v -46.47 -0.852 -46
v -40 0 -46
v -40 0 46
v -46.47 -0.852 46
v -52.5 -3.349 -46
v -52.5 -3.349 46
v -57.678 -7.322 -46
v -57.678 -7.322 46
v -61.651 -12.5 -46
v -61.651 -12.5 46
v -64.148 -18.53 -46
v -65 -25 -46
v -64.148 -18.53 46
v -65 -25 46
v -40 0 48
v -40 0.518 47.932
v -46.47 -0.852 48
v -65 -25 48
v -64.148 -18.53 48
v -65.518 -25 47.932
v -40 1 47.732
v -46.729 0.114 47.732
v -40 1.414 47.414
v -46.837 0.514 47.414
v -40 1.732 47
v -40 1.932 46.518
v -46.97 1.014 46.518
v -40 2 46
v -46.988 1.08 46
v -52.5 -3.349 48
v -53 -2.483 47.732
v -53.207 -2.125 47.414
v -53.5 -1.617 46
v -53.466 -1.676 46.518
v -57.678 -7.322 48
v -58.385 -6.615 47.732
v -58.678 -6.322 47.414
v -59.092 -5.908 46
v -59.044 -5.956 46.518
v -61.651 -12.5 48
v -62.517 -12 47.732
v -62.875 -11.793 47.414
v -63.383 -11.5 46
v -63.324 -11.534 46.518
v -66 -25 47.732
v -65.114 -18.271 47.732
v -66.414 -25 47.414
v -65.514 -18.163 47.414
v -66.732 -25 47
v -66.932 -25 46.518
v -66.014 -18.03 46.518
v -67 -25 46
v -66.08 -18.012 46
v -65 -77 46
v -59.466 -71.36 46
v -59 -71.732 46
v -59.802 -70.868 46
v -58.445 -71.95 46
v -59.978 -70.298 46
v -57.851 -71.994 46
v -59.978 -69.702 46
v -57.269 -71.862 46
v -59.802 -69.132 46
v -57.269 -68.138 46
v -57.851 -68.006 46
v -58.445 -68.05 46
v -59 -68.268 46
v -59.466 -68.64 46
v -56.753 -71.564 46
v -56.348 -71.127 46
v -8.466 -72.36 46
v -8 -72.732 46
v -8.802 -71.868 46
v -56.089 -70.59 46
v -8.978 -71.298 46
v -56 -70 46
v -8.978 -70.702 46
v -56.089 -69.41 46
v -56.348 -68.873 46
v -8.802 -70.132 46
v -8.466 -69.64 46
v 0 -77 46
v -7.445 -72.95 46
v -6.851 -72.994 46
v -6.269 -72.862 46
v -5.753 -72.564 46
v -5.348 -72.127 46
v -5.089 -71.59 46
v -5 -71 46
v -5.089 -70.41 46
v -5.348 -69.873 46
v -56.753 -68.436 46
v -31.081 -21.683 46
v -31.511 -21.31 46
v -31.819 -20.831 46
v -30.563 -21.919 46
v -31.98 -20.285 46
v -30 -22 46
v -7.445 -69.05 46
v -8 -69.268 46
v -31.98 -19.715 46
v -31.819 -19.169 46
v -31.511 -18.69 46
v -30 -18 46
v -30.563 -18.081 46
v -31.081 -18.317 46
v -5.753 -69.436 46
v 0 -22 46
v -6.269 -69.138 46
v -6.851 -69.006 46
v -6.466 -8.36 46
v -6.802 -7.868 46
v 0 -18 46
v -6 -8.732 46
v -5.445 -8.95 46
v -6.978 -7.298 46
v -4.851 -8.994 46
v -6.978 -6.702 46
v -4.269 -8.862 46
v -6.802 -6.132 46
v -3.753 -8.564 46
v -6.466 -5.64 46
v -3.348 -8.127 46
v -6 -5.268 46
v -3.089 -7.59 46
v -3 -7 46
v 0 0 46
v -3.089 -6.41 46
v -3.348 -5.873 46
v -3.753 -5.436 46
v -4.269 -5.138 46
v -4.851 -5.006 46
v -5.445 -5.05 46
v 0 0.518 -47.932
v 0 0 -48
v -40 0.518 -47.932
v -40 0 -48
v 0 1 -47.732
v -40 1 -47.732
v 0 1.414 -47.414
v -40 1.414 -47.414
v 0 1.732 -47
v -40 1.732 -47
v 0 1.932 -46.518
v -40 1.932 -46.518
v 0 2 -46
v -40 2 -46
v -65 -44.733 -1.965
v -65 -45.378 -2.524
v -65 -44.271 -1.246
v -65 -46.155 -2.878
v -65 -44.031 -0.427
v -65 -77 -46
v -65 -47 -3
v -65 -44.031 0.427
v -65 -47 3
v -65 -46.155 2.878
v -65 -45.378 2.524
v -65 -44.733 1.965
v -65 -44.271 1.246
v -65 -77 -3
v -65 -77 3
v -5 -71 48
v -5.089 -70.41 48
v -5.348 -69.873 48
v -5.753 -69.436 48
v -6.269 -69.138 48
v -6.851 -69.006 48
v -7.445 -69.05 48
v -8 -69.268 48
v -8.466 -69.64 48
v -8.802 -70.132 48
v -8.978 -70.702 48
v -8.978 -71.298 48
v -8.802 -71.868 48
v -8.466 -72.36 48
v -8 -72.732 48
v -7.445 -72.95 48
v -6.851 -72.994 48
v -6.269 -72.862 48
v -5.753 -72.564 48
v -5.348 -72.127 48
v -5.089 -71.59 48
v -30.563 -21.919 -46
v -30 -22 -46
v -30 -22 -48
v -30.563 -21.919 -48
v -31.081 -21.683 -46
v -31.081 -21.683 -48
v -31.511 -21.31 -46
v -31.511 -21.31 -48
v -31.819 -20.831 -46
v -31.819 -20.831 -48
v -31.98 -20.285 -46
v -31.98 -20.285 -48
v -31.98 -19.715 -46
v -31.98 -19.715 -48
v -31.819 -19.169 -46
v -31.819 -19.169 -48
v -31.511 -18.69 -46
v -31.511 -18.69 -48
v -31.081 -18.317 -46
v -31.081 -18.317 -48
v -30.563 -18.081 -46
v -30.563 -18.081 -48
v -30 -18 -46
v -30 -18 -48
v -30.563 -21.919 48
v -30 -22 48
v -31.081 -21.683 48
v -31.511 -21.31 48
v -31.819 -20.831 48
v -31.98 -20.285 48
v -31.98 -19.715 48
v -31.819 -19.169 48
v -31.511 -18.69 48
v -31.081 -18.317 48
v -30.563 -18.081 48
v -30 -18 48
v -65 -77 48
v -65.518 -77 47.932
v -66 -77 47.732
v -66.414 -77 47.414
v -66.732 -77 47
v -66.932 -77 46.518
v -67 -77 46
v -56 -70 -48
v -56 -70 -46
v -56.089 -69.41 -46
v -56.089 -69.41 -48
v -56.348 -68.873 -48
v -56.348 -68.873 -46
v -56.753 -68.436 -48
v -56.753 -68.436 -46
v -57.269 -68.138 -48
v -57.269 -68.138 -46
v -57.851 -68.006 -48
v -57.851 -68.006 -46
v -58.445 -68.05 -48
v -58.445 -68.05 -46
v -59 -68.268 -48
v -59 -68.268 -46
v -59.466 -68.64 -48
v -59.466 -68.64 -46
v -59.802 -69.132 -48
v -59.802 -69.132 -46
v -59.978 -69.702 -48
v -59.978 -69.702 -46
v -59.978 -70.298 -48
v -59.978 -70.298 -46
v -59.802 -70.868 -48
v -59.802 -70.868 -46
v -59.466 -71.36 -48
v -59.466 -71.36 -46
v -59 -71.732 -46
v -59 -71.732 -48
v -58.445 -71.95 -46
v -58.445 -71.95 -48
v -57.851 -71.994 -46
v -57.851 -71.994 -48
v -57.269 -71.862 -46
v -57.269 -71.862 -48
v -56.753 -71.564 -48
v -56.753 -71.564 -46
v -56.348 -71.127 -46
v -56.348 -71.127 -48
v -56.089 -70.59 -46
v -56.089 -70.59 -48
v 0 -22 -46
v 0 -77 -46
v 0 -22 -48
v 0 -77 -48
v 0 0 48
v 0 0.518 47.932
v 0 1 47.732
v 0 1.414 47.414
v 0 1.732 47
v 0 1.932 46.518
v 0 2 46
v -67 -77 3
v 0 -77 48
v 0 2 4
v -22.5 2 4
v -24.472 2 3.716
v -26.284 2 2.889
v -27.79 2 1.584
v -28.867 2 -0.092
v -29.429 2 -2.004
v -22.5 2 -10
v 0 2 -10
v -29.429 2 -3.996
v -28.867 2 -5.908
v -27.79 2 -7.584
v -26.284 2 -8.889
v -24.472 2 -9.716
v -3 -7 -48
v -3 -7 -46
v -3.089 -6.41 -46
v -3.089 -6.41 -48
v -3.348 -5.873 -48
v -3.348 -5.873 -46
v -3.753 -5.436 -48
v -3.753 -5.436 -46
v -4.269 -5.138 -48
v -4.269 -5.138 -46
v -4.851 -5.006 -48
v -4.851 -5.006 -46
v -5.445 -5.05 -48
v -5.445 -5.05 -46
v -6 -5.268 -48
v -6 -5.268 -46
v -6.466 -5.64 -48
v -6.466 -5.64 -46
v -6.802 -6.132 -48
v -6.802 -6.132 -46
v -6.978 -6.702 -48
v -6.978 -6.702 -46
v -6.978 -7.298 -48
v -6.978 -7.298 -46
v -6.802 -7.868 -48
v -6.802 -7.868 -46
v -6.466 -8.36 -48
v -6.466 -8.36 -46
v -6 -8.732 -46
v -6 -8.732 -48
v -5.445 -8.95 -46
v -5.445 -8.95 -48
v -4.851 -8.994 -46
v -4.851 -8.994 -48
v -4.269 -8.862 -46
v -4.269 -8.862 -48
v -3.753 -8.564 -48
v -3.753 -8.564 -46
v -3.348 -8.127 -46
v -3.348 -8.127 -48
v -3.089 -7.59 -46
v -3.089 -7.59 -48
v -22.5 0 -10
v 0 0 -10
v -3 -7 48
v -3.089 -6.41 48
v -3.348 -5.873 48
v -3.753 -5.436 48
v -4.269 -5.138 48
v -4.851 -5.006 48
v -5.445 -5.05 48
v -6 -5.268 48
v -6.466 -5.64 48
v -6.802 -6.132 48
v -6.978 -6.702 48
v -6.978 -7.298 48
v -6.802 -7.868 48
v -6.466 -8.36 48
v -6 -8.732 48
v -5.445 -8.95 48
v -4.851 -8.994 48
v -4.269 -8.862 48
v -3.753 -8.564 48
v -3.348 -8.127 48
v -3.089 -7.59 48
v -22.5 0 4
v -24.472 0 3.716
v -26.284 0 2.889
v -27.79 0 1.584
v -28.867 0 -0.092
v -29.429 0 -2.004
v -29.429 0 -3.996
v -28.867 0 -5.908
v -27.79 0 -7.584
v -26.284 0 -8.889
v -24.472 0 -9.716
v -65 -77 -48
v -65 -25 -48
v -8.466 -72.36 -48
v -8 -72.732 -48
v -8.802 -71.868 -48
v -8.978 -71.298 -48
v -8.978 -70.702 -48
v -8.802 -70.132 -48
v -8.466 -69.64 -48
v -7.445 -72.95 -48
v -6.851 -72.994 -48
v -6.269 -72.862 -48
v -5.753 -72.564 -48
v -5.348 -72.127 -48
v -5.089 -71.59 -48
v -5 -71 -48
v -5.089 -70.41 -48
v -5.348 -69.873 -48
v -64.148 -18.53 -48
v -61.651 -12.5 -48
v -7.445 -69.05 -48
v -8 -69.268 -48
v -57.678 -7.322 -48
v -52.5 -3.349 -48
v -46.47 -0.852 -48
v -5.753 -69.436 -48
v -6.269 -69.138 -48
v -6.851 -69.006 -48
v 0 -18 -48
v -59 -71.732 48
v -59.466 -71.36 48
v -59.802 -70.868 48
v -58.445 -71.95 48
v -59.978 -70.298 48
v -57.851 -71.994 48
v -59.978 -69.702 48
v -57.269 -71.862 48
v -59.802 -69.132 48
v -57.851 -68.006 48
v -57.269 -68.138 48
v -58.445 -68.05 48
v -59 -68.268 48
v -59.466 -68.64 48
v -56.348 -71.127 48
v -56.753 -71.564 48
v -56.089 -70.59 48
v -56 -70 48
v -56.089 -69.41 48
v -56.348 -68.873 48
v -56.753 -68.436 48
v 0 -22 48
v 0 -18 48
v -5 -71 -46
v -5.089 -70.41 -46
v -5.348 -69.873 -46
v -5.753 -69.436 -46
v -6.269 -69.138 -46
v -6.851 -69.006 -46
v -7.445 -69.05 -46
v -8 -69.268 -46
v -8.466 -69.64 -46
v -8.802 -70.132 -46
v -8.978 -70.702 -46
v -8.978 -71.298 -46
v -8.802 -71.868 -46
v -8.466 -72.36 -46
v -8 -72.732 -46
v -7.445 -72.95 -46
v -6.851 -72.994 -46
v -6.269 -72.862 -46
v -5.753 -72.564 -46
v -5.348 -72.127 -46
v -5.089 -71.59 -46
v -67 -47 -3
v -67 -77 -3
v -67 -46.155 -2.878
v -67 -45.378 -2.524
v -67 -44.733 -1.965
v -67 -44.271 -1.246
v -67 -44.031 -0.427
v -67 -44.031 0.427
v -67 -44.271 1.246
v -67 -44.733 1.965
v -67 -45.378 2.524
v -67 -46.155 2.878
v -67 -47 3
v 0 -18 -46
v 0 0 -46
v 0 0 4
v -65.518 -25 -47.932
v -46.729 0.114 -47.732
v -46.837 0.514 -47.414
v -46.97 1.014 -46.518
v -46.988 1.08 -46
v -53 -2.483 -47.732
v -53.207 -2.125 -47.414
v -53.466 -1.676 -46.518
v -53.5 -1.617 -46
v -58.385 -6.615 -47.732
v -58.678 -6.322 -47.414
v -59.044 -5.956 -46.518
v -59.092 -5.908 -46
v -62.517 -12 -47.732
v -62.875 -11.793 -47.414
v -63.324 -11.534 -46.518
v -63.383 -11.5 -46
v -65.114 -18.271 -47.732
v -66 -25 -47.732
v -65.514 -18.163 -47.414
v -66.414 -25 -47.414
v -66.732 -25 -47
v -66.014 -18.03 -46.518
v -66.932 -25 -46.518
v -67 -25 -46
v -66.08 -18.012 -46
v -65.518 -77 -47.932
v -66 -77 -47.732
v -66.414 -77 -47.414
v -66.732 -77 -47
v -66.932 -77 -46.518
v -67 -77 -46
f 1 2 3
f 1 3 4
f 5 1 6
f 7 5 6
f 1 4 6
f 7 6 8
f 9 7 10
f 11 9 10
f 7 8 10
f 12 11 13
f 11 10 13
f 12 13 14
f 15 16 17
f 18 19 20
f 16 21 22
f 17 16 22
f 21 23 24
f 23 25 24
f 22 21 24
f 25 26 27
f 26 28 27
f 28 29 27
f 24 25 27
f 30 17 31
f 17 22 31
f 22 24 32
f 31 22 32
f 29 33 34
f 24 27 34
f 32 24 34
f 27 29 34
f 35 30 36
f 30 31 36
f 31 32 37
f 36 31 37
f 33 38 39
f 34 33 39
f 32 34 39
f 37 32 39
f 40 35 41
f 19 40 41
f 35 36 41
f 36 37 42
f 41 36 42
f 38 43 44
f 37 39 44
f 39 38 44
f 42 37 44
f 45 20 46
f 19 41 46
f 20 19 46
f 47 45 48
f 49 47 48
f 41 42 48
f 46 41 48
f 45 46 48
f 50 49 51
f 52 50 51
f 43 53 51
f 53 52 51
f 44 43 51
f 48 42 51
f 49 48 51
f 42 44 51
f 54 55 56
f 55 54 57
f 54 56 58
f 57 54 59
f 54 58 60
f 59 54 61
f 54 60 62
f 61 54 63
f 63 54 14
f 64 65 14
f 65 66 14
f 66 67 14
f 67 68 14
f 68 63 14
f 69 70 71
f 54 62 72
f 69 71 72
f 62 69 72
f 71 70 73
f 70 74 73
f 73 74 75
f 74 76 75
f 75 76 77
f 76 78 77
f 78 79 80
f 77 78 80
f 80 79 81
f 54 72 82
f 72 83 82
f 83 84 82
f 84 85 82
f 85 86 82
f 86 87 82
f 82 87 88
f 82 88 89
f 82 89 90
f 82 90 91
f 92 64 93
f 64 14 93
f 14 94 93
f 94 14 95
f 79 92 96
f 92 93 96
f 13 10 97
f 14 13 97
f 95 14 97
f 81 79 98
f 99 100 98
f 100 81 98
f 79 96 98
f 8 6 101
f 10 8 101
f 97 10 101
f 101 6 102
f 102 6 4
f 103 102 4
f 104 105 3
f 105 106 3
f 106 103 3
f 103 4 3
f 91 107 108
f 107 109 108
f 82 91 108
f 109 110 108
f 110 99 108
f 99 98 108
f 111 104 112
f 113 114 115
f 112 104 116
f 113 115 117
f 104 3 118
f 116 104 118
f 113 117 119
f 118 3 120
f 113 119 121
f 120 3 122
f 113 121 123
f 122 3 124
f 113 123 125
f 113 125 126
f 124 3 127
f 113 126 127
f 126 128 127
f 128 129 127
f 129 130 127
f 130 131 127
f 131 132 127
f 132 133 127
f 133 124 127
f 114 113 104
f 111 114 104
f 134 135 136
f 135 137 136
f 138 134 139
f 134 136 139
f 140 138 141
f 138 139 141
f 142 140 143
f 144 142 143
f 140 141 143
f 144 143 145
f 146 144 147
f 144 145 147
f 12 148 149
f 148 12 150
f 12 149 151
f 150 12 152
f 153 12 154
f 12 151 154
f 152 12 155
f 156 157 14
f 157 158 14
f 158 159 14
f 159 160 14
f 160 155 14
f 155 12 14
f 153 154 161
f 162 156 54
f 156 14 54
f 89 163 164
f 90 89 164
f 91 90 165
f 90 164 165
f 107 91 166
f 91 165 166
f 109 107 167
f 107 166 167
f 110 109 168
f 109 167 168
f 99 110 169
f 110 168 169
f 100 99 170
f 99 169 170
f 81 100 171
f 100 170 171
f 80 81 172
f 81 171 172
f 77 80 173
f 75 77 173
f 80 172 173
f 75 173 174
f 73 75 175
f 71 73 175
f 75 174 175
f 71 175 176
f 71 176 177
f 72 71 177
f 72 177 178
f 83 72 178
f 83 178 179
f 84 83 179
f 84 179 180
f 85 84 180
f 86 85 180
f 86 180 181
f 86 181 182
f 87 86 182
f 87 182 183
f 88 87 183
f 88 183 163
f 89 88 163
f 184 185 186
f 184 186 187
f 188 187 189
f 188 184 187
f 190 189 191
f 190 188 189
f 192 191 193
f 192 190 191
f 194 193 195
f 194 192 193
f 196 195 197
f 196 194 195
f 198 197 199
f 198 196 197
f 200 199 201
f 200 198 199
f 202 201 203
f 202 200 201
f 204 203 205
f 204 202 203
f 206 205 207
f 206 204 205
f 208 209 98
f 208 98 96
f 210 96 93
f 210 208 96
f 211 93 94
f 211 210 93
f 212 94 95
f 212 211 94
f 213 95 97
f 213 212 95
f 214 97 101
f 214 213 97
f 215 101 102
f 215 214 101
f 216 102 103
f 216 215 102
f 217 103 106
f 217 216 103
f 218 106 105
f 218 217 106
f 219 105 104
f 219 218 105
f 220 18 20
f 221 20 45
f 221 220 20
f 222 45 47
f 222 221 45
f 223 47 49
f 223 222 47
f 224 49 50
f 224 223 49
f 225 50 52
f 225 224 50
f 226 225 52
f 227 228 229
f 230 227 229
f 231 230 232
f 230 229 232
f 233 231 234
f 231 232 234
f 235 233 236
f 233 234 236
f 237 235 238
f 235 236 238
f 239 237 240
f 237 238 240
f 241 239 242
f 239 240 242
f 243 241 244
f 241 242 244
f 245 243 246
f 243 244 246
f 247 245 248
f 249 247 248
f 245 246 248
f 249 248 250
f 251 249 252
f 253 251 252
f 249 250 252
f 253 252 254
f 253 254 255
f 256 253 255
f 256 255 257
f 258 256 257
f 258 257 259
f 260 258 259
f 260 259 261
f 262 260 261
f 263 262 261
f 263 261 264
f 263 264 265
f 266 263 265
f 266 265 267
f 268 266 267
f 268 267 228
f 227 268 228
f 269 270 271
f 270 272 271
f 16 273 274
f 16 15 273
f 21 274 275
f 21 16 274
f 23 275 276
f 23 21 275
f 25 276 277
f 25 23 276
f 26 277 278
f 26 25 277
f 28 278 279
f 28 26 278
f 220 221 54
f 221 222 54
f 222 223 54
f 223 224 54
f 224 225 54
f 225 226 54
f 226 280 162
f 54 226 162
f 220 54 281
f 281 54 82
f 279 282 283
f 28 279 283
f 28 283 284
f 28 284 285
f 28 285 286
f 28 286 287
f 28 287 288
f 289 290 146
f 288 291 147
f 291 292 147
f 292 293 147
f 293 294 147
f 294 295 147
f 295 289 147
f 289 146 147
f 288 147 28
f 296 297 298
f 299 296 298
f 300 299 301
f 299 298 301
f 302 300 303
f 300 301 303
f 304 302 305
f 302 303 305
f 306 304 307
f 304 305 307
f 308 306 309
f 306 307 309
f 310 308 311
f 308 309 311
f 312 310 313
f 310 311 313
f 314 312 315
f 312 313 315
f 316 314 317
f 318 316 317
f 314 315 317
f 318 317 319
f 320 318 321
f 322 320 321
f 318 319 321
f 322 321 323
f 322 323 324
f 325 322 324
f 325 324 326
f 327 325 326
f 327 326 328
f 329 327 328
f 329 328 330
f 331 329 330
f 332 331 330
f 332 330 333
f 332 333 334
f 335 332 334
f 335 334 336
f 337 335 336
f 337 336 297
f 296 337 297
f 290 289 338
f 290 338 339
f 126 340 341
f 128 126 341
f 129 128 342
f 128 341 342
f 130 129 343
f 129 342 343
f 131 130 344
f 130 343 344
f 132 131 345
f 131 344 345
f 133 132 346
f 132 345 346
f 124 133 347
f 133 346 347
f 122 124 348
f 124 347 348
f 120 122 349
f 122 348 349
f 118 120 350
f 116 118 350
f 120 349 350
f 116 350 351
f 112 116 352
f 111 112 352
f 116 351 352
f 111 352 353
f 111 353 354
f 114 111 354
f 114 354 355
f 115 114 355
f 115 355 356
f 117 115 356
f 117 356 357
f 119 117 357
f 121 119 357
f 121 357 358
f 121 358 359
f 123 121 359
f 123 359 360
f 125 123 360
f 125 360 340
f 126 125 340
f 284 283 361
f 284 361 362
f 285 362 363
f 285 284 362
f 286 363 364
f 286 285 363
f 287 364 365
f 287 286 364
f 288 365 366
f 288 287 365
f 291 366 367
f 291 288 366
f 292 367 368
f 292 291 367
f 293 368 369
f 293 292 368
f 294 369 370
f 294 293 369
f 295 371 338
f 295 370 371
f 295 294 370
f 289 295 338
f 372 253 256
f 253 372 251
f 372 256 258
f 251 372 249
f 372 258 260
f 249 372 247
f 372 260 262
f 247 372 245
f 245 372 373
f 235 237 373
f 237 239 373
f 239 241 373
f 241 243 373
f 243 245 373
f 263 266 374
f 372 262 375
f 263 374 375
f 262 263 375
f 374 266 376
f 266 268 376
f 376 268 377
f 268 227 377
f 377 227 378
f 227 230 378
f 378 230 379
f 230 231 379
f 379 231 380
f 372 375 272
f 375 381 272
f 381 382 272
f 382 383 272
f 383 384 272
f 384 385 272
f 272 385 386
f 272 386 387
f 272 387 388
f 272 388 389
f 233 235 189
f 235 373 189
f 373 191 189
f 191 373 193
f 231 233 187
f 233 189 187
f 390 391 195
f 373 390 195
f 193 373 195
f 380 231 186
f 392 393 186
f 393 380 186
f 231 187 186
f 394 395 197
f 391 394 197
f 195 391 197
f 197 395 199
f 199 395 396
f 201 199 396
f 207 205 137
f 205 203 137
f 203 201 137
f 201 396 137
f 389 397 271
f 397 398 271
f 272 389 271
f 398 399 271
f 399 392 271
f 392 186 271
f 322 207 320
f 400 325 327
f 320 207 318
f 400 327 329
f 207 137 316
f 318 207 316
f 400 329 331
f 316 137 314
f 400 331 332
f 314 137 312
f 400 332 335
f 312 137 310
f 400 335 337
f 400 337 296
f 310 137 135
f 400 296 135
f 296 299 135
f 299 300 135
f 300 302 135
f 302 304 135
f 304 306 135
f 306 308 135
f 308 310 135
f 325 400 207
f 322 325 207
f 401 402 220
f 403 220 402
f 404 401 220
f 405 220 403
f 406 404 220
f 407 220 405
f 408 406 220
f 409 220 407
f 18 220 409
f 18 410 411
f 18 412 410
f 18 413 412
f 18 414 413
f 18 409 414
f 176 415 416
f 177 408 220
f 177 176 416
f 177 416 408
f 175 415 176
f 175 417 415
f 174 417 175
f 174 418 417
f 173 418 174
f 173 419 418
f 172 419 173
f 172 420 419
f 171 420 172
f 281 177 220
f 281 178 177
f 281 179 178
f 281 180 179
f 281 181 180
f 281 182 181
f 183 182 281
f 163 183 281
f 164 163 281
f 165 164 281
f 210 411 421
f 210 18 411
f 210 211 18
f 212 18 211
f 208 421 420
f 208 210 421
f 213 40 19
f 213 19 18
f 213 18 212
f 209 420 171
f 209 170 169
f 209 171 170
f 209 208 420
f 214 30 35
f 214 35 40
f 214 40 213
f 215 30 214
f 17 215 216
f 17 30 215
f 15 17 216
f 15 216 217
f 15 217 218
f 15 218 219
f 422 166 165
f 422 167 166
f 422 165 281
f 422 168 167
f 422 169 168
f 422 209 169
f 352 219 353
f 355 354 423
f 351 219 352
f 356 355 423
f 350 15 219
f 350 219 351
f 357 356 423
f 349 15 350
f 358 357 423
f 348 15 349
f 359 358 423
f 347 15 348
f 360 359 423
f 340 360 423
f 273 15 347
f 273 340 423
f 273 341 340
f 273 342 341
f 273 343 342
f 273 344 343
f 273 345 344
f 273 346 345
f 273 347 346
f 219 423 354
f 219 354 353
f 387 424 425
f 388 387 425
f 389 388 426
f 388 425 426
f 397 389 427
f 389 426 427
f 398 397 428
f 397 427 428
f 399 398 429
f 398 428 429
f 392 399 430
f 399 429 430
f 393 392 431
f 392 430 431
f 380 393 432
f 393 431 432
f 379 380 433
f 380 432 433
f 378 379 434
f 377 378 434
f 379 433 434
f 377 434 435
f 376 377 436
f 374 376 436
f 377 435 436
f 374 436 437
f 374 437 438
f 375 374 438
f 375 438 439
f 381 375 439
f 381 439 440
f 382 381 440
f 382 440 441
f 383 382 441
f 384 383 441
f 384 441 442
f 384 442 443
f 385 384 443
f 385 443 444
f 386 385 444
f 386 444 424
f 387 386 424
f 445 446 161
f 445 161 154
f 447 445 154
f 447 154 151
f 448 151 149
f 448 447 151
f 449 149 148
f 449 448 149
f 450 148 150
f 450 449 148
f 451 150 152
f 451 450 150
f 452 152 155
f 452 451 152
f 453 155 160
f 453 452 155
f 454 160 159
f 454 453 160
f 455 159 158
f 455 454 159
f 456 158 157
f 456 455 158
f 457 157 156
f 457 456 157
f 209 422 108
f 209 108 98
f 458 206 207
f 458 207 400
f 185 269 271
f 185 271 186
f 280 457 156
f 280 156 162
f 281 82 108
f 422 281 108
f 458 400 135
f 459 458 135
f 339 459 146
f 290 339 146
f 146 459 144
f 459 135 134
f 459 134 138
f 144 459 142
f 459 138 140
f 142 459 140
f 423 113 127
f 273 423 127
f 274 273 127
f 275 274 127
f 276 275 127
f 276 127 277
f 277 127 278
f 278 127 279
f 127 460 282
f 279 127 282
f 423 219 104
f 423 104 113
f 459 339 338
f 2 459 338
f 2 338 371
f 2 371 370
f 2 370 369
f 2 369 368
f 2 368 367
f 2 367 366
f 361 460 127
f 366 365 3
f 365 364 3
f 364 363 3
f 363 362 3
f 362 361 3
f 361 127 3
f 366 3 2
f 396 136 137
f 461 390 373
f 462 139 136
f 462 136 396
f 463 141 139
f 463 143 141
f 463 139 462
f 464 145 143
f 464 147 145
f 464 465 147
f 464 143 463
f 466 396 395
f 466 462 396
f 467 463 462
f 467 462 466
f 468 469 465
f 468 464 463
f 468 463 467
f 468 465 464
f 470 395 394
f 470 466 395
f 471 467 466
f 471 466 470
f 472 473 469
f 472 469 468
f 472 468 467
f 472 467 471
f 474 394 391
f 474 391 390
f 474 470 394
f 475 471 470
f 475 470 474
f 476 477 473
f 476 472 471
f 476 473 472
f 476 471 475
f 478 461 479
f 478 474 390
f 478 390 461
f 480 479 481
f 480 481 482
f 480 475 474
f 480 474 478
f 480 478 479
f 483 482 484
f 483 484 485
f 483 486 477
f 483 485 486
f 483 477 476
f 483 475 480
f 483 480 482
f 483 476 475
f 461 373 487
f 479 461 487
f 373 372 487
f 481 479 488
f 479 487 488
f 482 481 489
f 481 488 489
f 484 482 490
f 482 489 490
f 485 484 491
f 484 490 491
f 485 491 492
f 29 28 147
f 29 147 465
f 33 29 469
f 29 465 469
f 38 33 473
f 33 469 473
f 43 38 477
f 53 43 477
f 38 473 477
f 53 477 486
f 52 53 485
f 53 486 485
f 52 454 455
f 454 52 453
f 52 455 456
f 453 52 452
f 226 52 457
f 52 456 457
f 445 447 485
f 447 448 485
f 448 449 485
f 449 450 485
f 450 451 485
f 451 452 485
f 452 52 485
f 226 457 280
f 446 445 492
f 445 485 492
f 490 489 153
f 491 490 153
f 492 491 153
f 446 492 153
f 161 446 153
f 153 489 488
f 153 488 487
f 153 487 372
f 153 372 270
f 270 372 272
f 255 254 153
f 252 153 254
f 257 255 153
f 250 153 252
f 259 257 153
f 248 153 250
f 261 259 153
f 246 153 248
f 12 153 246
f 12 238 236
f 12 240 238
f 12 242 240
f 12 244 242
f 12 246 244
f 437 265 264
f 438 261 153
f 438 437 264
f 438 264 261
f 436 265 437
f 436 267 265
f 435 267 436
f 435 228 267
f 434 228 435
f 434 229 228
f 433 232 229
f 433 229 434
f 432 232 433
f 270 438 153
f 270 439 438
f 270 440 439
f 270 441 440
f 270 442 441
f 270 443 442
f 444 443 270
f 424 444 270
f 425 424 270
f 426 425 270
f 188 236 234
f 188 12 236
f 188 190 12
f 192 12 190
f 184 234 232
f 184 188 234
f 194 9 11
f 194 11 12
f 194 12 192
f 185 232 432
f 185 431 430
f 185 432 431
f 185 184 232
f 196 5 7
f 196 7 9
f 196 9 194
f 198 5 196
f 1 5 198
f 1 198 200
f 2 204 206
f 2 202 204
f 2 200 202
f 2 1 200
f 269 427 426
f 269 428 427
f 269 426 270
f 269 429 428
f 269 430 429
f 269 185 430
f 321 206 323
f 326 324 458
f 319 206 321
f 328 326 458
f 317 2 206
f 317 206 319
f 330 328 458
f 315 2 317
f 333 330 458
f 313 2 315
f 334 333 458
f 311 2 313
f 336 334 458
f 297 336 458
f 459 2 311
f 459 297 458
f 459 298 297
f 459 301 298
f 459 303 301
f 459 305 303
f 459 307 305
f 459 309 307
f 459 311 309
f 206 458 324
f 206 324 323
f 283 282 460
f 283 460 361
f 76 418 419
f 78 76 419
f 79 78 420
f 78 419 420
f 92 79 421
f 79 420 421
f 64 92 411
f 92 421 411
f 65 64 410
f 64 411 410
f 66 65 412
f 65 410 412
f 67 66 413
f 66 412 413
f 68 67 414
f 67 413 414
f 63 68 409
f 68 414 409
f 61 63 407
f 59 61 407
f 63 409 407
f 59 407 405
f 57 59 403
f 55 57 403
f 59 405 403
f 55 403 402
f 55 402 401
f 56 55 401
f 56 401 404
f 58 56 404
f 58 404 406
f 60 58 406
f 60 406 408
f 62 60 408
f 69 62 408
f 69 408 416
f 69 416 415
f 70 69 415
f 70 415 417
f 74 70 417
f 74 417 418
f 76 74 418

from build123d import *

# Parameters (mm, degrees)
BOSS_EXTRUDE1_DEPTH = 46
BOSS_EXTRUDE2_START = 2
BOSS_EXTRUDE2_DEPTH = 2
FILLET1_R           = 2
CUT_EXTRUDE1_DEPTH  = 5
CUT_EXTRUDE2_DEPTH  = 141.121375957
CUT_EXTRUDE3_DEPTH  = 115.166545012
SKETCH6_R           = 2
CUT_EXTRUDE4_DEPTH  = 141.121375957


with BuildPart() as part:
    # Sketch1 → Boss-Extrude1 (new, symmetric)
    with BuildSketch(Plane.XY):
        with BuildLine():
            Line((0, 0), (-40, 0))
            ThreePointArc((-40, 0), (-57.67766953, -7.32233047), (-65, -25))
            Line((-65, -25), (-65, -77))
            Line((-65, -77), (-67, -77))
            Line((-67, -77), (-67, -25))
            ThreePointArc((-67, -25), (-59.091883092, -5.908116908), (-40, 2))
            Line((-40, 2), (0, 2))
            Line((0, 2), (0, 0))
        make_face()
    extrude(amount=BOSS_EXTRUDE1_DEPTH, both=True)

    # Sketch2 → Boss-Extrude2 (add)
    with BuildSketch(Plane.XY.offset(46).offset(BOSS_EXTRUDE2_START)):
        with BuildLine():
            Line((-67, -25), (-67, -77))
            Line((-67, -77), (0, -77))
            Line((0, -77), (0, 2))
            Line((0, 2), (-40, 2))
            ThreePointArc((-40, 2), (-59.091883092, -5.908116908), (-67, -25))
        make_face()
    boss_extrude2 = extrude(amount=-BOSS_EXTRUDE2_DEPTH)

    # Mirror1: Boss-Extrude2 across plane
    add(boss_extrude2.mirror(Plane.XY))

    # Fillet1
    fillet1_edges = [part.edges().sort_by_distance(p)[0] for p in [
        (-59.091883092, -5.908116908, 48),
        (-67, -51, 48),
        (-20, 2, 48),
        (-59.091883092, -5.908116908, -48),
        (-20, 2, -48),
        (-67, -51, -48),
    ]]
    fillet(fillet1_edges, radius=FILLET1_R)

    # Sketch3 → Cut-Extrude1 (cut)
    with BuildSketch(Plane.ZY.offset(67)):
        with BuildLine():
            Line((-3, -77), (-3, -47))
            ThreePointArc((-3, -47), (0, -44), (3, -47))
            Line((3, -47), (3, -77))
            ThreePointArc((3, -77), (0, -80), (-3, -77))
        make_face()
    extrude(amount=-CUT_EXTRUDE1_DEPTH, mode=Mode.SUBTRACT)

    # Sketch4 → Cut-Extrude2 (cut, through all)
    with BuildSketch(Plane.XY.offset(48)):
        with BuildLine():
            Line((0, -22), (-30, -22))
            ThreePointArc((-30, -22), (-32, -20), (-30, -18))
            Line((-30, -18), (0, -18))
            ThreePointArc((0, -18), (2, -20), (0, -22))
        make_face()
    extrude(amount=-CUT_EXTRUDE2_DEPTH, mode=Mode.SUBTRACT)

    # Sketch5 → Cut-Extrude3 (cut, through all)
    with BuildSketch(Plane(origin=(0, 2, 0), x_dir=(1, 0, 0), z_dir=(0, 1, 0))):
        with BuildLine():
            Line((0, -4), (-22.5, -4))
            ThreePointArc((-22.5, -4), (-29.5, 3), (-22.5, 10))
            Line((-22.5, 10), (0, 10))
            ThreePointArc((0, 10), (7, 3), (0, -4))
        make_face()
    extrude(amount=-CUT_EXTRUDE3_DEPTH, mode=Mode.SUBTRACT)

    # Sketch6 → Cut-Extrude4 (cut, through all)
    with BuildSketch(Plane.XY.offset(48)):
        with Locations((-5, -7)):
            Circle(SKETCH6_R)
        with Locations((-7, -71)):
            Circle(SKETCH6_R)
        with Locations((-58, -70)):
            Circle(SKETCH6_R)
    extrude(amount=-CUT_EXTRUDE4_DEPTH, mode=Mode.SUBTRACT)


solid = part.part
